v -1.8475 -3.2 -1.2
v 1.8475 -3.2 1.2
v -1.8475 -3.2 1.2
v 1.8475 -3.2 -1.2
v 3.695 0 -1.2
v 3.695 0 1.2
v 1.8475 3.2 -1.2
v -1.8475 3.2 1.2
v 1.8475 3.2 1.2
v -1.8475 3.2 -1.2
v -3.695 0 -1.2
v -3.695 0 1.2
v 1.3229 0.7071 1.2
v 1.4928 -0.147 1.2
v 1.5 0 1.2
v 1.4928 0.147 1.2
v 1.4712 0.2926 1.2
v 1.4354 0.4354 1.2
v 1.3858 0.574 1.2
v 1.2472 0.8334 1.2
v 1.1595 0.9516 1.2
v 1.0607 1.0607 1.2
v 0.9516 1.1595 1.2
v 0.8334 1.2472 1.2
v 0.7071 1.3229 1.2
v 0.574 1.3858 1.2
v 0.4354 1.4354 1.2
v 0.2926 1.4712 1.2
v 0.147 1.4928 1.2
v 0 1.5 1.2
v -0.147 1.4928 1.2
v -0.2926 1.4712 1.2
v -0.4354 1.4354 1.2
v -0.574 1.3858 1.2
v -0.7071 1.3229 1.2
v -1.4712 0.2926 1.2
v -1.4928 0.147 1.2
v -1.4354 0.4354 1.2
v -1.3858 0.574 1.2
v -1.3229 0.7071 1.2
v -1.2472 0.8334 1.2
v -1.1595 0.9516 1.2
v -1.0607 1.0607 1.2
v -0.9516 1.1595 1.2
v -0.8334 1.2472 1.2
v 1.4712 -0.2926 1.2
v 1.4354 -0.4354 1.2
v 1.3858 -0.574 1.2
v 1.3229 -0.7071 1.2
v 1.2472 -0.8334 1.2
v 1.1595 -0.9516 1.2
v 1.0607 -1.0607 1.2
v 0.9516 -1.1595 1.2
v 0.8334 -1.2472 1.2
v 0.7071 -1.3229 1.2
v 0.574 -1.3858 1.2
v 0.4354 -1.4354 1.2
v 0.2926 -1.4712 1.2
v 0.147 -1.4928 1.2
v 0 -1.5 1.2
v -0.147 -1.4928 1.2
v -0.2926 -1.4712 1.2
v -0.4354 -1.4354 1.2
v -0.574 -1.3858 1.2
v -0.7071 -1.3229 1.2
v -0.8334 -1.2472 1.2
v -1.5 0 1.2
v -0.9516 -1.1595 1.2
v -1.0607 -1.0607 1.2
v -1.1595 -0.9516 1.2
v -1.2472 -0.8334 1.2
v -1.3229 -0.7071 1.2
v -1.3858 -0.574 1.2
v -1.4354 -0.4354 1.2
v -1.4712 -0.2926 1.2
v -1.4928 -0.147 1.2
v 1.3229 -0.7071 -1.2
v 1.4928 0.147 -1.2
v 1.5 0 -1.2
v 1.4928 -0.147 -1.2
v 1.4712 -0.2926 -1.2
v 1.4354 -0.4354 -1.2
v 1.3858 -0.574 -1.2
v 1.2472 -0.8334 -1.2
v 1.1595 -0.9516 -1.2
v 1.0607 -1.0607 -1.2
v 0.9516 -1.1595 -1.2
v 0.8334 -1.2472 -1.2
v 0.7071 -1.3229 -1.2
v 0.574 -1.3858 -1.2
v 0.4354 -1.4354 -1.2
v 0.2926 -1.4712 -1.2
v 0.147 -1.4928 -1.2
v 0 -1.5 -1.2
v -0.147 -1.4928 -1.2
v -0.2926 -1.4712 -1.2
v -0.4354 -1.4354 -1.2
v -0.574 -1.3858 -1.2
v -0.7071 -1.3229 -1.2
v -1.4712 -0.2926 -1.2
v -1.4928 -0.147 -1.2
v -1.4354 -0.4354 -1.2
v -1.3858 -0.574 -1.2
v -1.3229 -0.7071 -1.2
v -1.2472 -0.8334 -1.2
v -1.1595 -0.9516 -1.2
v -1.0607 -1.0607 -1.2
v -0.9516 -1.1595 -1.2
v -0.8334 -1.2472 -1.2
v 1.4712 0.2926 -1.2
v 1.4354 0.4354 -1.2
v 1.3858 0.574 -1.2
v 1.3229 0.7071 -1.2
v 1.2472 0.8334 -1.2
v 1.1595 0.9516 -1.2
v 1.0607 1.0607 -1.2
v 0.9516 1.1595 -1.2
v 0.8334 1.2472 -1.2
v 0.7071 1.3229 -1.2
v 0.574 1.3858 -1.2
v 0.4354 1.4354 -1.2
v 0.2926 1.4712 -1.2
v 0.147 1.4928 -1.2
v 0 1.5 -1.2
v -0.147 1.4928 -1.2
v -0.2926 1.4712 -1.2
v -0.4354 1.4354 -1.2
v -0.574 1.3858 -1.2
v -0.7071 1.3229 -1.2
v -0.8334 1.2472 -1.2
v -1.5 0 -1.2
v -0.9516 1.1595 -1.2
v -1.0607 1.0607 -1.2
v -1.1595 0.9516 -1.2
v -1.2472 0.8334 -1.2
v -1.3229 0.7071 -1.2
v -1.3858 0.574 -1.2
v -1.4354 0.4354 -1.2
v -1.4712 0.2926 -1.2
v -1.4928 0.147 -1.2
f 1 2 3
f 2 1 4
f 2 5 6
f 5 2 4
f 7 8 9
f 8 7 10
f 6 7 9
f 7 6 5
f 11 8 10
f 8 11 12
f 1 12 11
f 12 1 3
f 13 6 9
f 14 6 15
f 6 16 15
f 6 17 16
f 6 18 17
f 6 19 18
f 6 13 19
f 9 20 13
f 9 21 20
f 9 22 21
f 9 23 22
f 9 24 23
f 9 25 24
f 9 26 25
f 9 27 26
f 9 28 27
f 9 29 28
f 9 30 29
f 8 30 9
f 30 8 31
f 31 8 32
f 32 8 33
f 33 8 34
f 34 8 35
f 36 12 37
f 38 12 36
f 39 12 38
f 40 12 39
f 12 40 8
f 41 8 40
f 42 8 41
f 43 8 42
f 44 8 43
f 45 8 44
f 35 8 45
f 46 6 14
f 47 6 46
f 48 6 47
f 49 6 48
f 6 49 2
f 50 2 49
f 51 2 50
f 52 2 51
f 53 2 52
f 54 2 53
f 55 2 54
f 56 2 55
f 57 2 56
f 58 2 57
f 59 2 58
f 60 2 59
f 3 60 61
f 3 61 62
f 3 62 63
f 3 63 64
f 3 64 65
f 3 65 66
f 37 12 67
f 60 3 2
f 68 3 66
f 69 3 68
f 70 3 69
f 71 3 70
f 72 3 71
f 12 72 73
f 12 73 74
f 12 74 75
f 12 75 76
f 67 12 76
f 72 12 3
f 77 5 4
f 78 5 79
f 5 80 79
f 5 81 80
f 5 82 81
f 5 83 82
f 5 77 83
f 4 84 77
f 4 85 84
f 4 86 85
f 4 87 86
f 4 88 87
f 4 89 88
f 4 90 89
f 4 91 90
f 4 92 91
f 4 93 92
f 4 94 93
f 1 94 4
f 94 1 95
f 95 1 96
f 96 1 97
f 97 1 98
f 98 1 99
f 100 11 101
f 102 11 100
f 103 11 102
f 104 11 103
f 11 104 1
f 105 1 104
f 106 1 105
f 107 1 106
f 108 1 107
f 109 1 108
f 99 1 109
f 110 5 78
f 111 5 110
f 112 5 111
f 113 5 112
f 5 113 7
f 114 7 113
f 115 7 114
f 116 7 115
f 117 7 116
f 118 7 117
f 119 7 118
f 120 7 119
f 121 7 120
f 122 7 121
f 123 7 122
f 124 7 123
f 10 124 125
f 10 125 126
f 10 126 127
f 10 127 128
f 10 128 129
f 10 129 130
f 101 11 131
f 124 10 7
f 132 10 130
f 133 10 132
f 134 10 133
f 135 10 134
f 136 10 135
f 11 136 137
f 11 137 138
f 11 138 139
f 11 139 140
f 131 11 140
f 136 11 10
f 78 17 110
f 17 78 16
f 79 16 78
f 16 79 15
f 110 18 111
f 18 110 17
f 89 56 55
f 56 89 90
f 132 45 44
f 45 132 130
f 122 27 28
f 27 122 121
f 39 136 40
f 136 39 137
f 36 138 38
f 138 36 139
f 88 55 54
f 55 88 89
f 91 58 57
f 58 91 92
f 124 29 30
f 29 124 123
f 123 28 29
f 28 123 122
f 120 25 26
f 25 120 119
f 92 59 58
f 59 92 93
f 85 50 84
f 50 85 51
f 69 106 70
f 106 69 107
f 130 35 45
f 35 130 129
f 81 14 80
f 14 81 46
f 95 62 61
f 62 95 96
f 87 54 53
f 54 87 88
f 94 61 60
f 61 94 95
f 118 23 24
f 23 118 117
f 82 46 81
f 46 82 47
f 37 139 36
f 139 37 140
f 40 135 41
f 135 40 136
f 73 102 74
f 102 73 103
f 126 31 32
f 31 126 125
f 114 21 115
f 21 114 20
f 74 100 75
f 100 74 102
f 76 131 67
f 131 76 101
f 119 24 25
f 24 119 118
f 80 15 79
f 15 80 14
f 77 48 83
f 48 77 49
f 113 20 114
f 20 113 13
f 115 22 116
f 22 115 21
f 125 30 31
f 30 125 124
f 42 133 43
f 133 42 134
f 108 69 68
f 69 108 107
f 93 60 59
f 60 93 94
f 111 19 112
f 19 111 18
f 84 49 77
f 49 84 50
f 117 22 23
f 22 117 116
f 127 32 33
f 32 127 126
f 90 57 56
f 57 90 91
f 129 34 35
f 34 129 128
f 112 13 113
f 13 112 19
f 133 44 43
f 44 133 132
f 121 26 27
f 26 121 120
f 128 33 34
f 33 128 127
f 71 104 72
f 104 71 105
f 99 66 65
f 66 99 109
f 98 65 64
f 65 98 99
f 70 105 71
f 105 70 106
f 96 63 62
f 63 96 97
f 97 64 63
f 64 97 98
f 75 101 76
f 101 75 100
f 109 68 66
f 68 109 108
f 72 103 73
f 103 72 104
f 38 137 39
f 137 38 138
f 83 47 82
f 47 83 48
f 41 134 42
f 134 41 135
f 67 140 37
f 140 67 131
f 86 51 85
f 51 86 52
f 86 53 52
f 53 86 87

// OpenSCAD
$fn=64;

nut_thickness = 2.4;
across_flats = 6.4;
hole_d = 3.0;

module hex_prism(af, h){
    r = af / sqrt(3); // circumradius for given across-flats
    cylinder(h=h, r=r, center=true, $fn=6);
}

module nut(af, h, hole_d){
    difference(){
        hex_prism(af, h);
        cylinder(h=h+0.4, d=hole_d, center=true, $fn=64);
    }
}

nut(across_flats, nut_thickness, hole_d);
